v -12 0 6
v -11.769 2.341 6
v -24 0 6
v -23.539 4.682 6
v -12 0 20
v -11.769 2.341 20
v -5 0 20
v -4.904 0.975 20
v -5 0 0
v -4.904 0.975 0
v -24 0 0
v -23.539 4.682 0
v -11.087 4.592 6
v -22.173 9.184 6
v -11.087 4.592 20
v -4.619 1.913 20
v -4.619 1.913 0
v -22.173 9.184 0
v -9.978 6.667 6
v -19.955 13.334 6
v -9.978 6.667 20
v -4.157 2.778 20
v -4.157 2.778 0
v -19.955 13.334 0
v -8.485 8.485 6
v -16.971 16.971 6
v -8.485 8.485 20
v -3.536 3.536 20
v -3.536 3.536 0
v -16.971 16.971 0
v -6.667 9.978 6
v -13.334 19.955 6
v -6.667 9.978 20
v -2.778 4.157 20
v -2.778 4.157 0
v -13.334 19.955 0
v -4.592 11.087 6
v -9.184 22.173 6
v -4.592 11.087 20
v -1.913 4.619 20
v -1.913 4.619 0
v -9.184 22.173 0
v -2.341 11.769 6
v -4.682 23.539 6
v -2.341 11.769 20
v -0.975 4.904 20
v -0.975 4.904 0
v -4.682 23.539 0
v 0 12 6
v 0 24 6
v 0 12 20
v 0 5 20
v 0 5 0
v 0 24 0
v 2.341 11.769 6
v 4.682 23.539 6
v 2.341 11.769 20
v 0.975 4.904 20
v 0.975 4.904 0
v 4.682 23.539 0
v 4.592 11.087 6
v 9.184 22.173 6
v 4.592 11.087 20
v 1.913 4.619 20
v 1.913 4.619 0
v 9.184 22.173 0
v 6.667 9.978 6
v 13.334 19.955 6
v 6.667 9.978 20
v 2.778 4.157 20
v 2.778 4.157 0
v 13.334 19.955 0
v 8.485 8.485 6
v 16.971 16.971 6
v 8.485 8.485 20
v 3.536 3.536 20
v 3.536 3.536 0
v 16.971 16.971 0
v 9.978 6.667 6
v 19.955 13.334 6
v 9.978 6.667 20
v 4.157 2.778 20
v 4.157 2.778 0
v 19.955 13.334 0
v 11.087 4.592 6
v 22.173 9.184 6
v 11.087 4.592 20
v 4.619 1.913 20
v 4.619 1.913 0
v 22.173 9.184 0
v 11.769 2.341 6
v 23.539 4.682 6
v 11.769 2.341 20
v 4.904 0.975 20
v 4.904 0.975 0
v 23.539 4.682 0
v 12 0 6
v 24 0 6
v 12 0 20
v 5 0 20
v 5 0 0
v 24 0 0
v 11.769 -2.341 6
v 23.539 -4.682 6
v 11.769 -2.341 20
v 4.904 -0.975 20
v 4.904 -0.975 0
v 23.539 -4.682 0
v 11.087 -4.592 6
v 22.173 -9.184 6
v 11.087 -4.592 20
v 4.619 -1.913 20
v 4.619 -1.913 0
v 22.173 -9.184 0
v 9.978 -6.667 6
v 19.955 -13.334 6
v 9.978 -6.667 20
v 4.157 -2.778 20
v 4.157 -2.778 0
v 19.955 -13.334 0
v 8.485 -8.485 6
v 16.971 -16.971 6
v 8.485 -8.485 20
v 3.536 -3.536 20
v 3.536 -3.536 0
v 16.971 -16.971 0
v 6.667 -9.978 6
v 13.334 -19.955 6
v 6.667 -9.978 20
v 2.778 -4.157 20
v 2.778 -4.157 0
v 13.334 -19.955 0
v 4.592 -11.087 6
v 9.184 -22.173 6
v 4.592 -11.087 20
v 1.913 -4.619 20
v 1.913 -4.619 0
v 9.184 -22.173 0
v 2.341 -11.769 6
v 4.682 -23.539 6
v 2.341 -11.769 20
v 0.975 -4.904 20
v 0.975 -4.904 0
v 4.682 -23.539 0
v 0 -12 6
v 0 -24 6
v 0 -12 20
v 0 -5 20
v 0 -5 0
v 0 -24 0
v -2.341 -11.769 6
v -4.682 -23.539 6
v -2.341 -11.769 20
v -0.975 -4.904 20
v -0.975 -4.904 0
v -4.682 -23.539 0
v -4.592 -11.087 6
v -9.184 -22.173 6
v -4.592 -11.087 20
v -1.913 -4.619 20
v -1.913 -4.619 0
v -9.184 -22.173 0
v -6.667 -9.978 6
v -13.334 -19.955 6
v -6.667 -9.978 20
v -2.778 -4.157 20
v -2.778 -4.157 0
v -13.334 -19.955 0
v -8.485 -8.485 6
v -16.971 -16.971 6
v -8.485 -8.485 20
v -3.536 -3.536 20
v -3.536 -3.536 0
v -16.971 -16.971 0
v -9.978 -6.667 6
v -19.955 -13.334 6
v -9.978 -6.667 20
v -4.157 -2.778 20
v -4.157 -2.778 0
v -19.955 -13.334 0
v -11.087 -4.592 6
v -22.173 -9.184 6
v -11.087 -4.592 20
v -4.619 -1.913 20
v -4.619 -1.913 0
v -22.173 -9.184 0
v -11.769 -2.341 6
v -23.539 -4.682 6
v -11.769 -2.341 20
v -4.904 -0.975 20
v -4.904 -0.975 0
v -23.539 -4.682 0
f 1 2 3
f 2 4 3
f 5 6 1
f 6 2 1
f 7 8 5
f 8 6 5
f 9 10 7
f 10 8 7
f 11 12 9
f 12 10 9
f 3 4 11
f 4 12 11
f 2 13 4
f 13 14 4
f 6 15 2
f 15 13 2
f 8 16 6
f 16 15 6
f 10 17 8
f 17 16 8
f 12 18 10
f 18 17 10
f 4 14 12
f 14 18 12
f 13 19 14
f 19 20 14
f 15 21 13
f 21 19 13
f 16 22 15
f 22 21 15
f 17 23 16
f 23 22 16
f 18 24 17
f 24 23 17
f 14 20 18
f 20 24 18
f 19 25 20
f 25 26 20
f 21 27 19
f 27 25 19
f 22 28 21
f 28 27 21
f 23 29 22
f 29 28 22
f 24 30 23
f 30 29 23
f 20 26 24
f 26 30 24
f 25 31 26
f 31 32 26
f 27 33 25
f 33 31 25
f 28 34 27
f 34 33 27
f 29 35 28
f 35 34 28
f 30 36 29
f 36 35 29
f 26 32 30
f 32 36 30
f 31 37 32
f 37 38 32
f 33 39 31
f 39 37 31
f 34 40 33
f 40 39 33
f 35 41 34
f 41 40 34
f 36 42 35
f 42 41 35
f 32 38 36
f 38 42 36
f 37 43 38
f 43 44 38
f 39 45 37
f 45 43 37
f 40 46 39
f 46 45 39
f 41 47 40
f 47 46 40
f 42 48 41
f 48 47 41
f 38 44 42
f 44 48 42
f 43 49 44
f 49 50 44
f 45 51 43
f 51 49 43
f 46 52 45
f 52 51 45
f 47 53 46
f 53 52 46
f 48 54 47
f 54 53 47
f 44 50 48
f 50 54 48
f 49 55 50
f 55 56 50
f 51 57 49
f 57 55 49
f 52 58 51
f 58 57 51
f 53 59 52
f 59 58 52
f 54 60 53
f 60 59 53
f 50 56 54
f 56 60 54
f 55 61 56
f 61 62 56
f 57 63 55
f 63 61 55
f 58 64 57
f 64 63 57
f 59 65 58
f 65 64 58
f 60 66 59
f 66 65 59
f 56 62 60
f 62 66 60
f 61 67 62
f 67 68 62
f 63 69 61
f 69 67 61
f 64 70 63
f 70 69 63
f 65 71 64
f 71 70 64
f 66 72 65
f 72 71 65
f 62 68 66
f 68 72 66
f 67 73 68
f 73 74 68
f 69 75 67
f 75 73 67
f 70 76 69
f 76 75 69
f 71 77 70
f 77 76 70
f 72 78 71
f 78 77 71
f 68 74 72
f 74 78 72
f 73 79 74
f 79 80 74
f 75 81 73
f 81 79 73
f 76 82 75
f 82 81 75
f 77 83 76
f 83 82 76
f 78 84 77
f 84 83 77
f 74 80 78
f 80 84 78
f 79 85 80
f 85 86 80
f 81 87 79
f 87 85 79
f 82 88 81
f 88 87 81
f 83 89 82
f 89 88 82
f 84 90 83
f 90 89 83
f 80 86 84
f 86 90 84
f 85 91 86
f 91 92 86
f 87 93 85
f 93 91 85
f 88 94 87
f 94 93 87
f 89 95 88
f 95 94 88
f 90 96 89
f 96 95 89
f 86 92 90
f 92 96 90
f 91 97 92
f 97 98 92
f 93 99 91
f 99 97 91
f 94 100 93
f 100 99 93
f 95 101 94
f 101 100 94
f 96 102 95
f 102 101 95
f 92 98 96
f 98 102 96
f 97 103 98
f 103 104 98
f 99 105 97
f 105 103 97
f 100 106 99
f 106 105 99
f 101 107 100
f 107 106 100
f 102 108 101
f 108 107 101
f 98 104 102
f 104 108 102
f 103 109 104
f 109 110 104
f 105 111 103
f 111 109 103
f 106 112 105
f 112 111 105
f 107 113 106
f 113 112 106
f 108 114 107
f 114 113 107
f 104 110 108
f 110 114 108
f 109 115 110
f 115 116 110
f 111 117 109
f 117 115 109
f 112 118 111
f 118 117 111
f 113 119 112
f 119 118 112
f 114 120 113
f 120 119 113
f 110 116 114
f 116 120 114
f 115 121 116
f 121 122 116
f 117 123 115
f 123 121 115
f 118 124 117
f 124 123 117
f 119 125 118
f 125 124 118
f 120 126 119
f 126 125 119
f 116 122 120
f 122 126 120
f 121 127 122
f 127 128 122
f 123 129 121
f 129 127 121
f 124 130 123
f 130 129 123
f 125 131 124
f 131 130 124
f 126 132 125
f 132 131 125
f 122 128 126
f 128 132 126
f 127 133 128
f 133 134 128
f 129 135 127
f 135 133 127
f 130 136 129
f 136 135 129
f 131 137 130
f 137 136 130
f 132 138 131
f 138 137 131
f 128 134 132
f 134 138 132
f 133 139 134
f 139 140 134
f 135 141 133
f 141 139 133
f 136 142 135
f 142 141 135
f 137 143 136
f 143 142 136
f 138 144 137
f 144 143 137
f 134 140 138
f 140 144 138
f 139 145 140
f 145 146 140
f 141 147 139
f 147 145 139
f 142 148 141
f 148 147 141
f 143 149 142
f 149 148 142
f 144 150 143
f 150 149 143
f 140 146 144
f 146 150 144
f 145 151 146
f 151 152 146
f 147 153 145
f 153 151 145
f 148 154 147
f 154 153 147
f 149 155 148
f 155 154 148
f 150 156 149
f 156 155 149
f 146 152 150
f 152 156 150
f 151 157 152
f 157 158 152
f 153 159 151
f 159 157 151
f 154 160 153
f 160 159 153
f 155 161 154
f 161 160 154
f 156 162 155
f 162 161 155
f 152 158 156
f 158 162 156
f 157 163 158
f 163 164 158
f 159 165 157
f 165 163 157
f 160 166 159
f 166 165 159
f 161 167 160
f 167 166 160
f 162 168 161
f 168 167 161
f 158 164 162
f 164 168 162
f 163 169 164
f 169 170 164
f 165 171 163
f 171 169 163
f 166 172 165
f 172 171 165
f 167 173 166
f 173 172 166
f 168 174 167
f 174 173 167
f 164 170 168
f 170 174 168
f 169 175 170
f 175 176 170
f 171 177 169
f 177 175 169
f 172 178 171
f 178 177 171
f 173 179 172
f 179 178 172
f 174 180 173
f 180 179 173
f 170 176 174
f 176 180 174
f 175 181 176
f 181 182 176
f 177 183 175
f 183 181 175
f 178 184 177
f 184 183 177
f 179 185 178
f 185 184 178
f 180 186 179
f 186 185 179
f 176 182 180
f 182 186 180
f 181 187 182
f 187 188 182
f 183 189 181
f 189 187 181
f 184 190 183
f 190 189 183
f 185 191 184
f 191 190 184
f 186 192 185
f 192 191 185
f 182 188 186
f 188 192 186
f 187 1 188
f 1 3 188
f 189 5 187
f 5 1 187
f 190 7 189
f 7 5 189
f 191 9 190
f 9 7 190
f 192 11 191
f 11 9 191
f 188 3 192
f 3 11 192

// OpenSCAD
$fn = 32;

// ----------------------------------------------------------------------
// Revolved part: flanged bushing R24
// ----------------------------------------------------------------------

// --- parameters (mm) ---
bore_r = 5;               // bore radius
flange_r = 24;            // flange radius
flange_h = 6;             // flange thickness
sleeve_r = 12;            // sleeve radius
total_h = 20;             // overall height
revolve_angle = 360;      // revolve sweep, degrees
fit_tol = 0.1;            // declared fit tolerance (prompt contract)
free_tol = 0.3;           // declared free tolerance (prompt contract)

bore_d = 2 * bore_r;
flange_d = 2 * flange_r;
sleeve_d = 2 * sleeve_r;

profile = [[5, 0], [24, 0], [24, 6], [12, 6], [12, 20], [5, 20]];  // primary outline, 6 points, counter clockwise

// --- the one profile operation ---
rotate_extrude(angle = revolve_angle) polygon(points = profile);
